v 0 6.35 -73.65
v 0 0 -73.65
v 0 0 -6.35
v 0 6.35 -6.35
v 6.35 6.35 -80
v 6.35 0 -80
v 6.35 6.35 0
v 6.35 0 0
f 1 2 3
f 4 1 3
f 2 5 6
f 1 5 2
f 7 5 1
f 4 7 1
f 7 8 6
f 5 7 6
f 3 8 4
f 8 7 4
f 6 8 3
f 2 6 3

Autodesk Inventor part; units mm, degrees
ref_plane "YZ Plane" through (0, 0, 0) normal (1, 0, 0) x (0, 1, 0)
ref_plane "XZ Plane" through (0, 0, 0) normal (0, 1, 0) x (-1, 0, 0)
ref_plane "XY Plane" through (0, 0, 0) normal (0, 0, 1) x (1, 0, 0)
sketch "Sketch1" plane through (0, 0, 0) normal (0, 1, 0) x (-1, 0, 0)
  line L0 (0, 0) -> (-6.35, 0)
  line L1 (-6.35, 0) -> (-6.35, -80)
  line L2 (-6.35, -80) -> (0, -80)
  line L3 (0, -80) -> (0, 0)
  dimension "d0" = 6.35
  dimension "d1" = 80
extrude "Extrusion1" add sketch "Sketch1" along normal blind 6.35
sketch "Sketch2" plane through (0, 6.35, 0) normal (0, 1, 0) x (1, 0, 0)
  line L0 (0, 0) -> (6.35, 0) projected
  line L1 (6.35, 0) -> (0, 6.35)
  line L2 (0, 80) -> (0, 0) projected
  line L3 (6.35, 0) -> (15.3303, 0) construction
  line L4 (0, 6.35) -> (0, 0)
  line L5 (0, 0) -> (6.35, 0)
  dimension "d4" = 135
extrude "Extrusion2" cut sketch "Sketch2" against normal blind 10
sketch "Sketch3" plane through (0, 6.35, 0) normal (0, 1, 0) x (1, 0, 0)
  line L0 (6.35, 80) -> (0, 73.65)
  line L1 (6.35, 80) -> (15.3303, 80) construction
  line L2 (0, 73.65) -> (0, 80)
  line L3 (6.35, 0) -> (6.35, 80) projected
  line L4 (6.35, 80) -> (0, 80) projected
  line L5 (0, 80) -> (6.35, 80)
  point P0 (0, 0)
  dimension "d7" = 135
extrude "Extrusion3" cut sketch "Sketch3" against normal blind 10
properties part number "5"
